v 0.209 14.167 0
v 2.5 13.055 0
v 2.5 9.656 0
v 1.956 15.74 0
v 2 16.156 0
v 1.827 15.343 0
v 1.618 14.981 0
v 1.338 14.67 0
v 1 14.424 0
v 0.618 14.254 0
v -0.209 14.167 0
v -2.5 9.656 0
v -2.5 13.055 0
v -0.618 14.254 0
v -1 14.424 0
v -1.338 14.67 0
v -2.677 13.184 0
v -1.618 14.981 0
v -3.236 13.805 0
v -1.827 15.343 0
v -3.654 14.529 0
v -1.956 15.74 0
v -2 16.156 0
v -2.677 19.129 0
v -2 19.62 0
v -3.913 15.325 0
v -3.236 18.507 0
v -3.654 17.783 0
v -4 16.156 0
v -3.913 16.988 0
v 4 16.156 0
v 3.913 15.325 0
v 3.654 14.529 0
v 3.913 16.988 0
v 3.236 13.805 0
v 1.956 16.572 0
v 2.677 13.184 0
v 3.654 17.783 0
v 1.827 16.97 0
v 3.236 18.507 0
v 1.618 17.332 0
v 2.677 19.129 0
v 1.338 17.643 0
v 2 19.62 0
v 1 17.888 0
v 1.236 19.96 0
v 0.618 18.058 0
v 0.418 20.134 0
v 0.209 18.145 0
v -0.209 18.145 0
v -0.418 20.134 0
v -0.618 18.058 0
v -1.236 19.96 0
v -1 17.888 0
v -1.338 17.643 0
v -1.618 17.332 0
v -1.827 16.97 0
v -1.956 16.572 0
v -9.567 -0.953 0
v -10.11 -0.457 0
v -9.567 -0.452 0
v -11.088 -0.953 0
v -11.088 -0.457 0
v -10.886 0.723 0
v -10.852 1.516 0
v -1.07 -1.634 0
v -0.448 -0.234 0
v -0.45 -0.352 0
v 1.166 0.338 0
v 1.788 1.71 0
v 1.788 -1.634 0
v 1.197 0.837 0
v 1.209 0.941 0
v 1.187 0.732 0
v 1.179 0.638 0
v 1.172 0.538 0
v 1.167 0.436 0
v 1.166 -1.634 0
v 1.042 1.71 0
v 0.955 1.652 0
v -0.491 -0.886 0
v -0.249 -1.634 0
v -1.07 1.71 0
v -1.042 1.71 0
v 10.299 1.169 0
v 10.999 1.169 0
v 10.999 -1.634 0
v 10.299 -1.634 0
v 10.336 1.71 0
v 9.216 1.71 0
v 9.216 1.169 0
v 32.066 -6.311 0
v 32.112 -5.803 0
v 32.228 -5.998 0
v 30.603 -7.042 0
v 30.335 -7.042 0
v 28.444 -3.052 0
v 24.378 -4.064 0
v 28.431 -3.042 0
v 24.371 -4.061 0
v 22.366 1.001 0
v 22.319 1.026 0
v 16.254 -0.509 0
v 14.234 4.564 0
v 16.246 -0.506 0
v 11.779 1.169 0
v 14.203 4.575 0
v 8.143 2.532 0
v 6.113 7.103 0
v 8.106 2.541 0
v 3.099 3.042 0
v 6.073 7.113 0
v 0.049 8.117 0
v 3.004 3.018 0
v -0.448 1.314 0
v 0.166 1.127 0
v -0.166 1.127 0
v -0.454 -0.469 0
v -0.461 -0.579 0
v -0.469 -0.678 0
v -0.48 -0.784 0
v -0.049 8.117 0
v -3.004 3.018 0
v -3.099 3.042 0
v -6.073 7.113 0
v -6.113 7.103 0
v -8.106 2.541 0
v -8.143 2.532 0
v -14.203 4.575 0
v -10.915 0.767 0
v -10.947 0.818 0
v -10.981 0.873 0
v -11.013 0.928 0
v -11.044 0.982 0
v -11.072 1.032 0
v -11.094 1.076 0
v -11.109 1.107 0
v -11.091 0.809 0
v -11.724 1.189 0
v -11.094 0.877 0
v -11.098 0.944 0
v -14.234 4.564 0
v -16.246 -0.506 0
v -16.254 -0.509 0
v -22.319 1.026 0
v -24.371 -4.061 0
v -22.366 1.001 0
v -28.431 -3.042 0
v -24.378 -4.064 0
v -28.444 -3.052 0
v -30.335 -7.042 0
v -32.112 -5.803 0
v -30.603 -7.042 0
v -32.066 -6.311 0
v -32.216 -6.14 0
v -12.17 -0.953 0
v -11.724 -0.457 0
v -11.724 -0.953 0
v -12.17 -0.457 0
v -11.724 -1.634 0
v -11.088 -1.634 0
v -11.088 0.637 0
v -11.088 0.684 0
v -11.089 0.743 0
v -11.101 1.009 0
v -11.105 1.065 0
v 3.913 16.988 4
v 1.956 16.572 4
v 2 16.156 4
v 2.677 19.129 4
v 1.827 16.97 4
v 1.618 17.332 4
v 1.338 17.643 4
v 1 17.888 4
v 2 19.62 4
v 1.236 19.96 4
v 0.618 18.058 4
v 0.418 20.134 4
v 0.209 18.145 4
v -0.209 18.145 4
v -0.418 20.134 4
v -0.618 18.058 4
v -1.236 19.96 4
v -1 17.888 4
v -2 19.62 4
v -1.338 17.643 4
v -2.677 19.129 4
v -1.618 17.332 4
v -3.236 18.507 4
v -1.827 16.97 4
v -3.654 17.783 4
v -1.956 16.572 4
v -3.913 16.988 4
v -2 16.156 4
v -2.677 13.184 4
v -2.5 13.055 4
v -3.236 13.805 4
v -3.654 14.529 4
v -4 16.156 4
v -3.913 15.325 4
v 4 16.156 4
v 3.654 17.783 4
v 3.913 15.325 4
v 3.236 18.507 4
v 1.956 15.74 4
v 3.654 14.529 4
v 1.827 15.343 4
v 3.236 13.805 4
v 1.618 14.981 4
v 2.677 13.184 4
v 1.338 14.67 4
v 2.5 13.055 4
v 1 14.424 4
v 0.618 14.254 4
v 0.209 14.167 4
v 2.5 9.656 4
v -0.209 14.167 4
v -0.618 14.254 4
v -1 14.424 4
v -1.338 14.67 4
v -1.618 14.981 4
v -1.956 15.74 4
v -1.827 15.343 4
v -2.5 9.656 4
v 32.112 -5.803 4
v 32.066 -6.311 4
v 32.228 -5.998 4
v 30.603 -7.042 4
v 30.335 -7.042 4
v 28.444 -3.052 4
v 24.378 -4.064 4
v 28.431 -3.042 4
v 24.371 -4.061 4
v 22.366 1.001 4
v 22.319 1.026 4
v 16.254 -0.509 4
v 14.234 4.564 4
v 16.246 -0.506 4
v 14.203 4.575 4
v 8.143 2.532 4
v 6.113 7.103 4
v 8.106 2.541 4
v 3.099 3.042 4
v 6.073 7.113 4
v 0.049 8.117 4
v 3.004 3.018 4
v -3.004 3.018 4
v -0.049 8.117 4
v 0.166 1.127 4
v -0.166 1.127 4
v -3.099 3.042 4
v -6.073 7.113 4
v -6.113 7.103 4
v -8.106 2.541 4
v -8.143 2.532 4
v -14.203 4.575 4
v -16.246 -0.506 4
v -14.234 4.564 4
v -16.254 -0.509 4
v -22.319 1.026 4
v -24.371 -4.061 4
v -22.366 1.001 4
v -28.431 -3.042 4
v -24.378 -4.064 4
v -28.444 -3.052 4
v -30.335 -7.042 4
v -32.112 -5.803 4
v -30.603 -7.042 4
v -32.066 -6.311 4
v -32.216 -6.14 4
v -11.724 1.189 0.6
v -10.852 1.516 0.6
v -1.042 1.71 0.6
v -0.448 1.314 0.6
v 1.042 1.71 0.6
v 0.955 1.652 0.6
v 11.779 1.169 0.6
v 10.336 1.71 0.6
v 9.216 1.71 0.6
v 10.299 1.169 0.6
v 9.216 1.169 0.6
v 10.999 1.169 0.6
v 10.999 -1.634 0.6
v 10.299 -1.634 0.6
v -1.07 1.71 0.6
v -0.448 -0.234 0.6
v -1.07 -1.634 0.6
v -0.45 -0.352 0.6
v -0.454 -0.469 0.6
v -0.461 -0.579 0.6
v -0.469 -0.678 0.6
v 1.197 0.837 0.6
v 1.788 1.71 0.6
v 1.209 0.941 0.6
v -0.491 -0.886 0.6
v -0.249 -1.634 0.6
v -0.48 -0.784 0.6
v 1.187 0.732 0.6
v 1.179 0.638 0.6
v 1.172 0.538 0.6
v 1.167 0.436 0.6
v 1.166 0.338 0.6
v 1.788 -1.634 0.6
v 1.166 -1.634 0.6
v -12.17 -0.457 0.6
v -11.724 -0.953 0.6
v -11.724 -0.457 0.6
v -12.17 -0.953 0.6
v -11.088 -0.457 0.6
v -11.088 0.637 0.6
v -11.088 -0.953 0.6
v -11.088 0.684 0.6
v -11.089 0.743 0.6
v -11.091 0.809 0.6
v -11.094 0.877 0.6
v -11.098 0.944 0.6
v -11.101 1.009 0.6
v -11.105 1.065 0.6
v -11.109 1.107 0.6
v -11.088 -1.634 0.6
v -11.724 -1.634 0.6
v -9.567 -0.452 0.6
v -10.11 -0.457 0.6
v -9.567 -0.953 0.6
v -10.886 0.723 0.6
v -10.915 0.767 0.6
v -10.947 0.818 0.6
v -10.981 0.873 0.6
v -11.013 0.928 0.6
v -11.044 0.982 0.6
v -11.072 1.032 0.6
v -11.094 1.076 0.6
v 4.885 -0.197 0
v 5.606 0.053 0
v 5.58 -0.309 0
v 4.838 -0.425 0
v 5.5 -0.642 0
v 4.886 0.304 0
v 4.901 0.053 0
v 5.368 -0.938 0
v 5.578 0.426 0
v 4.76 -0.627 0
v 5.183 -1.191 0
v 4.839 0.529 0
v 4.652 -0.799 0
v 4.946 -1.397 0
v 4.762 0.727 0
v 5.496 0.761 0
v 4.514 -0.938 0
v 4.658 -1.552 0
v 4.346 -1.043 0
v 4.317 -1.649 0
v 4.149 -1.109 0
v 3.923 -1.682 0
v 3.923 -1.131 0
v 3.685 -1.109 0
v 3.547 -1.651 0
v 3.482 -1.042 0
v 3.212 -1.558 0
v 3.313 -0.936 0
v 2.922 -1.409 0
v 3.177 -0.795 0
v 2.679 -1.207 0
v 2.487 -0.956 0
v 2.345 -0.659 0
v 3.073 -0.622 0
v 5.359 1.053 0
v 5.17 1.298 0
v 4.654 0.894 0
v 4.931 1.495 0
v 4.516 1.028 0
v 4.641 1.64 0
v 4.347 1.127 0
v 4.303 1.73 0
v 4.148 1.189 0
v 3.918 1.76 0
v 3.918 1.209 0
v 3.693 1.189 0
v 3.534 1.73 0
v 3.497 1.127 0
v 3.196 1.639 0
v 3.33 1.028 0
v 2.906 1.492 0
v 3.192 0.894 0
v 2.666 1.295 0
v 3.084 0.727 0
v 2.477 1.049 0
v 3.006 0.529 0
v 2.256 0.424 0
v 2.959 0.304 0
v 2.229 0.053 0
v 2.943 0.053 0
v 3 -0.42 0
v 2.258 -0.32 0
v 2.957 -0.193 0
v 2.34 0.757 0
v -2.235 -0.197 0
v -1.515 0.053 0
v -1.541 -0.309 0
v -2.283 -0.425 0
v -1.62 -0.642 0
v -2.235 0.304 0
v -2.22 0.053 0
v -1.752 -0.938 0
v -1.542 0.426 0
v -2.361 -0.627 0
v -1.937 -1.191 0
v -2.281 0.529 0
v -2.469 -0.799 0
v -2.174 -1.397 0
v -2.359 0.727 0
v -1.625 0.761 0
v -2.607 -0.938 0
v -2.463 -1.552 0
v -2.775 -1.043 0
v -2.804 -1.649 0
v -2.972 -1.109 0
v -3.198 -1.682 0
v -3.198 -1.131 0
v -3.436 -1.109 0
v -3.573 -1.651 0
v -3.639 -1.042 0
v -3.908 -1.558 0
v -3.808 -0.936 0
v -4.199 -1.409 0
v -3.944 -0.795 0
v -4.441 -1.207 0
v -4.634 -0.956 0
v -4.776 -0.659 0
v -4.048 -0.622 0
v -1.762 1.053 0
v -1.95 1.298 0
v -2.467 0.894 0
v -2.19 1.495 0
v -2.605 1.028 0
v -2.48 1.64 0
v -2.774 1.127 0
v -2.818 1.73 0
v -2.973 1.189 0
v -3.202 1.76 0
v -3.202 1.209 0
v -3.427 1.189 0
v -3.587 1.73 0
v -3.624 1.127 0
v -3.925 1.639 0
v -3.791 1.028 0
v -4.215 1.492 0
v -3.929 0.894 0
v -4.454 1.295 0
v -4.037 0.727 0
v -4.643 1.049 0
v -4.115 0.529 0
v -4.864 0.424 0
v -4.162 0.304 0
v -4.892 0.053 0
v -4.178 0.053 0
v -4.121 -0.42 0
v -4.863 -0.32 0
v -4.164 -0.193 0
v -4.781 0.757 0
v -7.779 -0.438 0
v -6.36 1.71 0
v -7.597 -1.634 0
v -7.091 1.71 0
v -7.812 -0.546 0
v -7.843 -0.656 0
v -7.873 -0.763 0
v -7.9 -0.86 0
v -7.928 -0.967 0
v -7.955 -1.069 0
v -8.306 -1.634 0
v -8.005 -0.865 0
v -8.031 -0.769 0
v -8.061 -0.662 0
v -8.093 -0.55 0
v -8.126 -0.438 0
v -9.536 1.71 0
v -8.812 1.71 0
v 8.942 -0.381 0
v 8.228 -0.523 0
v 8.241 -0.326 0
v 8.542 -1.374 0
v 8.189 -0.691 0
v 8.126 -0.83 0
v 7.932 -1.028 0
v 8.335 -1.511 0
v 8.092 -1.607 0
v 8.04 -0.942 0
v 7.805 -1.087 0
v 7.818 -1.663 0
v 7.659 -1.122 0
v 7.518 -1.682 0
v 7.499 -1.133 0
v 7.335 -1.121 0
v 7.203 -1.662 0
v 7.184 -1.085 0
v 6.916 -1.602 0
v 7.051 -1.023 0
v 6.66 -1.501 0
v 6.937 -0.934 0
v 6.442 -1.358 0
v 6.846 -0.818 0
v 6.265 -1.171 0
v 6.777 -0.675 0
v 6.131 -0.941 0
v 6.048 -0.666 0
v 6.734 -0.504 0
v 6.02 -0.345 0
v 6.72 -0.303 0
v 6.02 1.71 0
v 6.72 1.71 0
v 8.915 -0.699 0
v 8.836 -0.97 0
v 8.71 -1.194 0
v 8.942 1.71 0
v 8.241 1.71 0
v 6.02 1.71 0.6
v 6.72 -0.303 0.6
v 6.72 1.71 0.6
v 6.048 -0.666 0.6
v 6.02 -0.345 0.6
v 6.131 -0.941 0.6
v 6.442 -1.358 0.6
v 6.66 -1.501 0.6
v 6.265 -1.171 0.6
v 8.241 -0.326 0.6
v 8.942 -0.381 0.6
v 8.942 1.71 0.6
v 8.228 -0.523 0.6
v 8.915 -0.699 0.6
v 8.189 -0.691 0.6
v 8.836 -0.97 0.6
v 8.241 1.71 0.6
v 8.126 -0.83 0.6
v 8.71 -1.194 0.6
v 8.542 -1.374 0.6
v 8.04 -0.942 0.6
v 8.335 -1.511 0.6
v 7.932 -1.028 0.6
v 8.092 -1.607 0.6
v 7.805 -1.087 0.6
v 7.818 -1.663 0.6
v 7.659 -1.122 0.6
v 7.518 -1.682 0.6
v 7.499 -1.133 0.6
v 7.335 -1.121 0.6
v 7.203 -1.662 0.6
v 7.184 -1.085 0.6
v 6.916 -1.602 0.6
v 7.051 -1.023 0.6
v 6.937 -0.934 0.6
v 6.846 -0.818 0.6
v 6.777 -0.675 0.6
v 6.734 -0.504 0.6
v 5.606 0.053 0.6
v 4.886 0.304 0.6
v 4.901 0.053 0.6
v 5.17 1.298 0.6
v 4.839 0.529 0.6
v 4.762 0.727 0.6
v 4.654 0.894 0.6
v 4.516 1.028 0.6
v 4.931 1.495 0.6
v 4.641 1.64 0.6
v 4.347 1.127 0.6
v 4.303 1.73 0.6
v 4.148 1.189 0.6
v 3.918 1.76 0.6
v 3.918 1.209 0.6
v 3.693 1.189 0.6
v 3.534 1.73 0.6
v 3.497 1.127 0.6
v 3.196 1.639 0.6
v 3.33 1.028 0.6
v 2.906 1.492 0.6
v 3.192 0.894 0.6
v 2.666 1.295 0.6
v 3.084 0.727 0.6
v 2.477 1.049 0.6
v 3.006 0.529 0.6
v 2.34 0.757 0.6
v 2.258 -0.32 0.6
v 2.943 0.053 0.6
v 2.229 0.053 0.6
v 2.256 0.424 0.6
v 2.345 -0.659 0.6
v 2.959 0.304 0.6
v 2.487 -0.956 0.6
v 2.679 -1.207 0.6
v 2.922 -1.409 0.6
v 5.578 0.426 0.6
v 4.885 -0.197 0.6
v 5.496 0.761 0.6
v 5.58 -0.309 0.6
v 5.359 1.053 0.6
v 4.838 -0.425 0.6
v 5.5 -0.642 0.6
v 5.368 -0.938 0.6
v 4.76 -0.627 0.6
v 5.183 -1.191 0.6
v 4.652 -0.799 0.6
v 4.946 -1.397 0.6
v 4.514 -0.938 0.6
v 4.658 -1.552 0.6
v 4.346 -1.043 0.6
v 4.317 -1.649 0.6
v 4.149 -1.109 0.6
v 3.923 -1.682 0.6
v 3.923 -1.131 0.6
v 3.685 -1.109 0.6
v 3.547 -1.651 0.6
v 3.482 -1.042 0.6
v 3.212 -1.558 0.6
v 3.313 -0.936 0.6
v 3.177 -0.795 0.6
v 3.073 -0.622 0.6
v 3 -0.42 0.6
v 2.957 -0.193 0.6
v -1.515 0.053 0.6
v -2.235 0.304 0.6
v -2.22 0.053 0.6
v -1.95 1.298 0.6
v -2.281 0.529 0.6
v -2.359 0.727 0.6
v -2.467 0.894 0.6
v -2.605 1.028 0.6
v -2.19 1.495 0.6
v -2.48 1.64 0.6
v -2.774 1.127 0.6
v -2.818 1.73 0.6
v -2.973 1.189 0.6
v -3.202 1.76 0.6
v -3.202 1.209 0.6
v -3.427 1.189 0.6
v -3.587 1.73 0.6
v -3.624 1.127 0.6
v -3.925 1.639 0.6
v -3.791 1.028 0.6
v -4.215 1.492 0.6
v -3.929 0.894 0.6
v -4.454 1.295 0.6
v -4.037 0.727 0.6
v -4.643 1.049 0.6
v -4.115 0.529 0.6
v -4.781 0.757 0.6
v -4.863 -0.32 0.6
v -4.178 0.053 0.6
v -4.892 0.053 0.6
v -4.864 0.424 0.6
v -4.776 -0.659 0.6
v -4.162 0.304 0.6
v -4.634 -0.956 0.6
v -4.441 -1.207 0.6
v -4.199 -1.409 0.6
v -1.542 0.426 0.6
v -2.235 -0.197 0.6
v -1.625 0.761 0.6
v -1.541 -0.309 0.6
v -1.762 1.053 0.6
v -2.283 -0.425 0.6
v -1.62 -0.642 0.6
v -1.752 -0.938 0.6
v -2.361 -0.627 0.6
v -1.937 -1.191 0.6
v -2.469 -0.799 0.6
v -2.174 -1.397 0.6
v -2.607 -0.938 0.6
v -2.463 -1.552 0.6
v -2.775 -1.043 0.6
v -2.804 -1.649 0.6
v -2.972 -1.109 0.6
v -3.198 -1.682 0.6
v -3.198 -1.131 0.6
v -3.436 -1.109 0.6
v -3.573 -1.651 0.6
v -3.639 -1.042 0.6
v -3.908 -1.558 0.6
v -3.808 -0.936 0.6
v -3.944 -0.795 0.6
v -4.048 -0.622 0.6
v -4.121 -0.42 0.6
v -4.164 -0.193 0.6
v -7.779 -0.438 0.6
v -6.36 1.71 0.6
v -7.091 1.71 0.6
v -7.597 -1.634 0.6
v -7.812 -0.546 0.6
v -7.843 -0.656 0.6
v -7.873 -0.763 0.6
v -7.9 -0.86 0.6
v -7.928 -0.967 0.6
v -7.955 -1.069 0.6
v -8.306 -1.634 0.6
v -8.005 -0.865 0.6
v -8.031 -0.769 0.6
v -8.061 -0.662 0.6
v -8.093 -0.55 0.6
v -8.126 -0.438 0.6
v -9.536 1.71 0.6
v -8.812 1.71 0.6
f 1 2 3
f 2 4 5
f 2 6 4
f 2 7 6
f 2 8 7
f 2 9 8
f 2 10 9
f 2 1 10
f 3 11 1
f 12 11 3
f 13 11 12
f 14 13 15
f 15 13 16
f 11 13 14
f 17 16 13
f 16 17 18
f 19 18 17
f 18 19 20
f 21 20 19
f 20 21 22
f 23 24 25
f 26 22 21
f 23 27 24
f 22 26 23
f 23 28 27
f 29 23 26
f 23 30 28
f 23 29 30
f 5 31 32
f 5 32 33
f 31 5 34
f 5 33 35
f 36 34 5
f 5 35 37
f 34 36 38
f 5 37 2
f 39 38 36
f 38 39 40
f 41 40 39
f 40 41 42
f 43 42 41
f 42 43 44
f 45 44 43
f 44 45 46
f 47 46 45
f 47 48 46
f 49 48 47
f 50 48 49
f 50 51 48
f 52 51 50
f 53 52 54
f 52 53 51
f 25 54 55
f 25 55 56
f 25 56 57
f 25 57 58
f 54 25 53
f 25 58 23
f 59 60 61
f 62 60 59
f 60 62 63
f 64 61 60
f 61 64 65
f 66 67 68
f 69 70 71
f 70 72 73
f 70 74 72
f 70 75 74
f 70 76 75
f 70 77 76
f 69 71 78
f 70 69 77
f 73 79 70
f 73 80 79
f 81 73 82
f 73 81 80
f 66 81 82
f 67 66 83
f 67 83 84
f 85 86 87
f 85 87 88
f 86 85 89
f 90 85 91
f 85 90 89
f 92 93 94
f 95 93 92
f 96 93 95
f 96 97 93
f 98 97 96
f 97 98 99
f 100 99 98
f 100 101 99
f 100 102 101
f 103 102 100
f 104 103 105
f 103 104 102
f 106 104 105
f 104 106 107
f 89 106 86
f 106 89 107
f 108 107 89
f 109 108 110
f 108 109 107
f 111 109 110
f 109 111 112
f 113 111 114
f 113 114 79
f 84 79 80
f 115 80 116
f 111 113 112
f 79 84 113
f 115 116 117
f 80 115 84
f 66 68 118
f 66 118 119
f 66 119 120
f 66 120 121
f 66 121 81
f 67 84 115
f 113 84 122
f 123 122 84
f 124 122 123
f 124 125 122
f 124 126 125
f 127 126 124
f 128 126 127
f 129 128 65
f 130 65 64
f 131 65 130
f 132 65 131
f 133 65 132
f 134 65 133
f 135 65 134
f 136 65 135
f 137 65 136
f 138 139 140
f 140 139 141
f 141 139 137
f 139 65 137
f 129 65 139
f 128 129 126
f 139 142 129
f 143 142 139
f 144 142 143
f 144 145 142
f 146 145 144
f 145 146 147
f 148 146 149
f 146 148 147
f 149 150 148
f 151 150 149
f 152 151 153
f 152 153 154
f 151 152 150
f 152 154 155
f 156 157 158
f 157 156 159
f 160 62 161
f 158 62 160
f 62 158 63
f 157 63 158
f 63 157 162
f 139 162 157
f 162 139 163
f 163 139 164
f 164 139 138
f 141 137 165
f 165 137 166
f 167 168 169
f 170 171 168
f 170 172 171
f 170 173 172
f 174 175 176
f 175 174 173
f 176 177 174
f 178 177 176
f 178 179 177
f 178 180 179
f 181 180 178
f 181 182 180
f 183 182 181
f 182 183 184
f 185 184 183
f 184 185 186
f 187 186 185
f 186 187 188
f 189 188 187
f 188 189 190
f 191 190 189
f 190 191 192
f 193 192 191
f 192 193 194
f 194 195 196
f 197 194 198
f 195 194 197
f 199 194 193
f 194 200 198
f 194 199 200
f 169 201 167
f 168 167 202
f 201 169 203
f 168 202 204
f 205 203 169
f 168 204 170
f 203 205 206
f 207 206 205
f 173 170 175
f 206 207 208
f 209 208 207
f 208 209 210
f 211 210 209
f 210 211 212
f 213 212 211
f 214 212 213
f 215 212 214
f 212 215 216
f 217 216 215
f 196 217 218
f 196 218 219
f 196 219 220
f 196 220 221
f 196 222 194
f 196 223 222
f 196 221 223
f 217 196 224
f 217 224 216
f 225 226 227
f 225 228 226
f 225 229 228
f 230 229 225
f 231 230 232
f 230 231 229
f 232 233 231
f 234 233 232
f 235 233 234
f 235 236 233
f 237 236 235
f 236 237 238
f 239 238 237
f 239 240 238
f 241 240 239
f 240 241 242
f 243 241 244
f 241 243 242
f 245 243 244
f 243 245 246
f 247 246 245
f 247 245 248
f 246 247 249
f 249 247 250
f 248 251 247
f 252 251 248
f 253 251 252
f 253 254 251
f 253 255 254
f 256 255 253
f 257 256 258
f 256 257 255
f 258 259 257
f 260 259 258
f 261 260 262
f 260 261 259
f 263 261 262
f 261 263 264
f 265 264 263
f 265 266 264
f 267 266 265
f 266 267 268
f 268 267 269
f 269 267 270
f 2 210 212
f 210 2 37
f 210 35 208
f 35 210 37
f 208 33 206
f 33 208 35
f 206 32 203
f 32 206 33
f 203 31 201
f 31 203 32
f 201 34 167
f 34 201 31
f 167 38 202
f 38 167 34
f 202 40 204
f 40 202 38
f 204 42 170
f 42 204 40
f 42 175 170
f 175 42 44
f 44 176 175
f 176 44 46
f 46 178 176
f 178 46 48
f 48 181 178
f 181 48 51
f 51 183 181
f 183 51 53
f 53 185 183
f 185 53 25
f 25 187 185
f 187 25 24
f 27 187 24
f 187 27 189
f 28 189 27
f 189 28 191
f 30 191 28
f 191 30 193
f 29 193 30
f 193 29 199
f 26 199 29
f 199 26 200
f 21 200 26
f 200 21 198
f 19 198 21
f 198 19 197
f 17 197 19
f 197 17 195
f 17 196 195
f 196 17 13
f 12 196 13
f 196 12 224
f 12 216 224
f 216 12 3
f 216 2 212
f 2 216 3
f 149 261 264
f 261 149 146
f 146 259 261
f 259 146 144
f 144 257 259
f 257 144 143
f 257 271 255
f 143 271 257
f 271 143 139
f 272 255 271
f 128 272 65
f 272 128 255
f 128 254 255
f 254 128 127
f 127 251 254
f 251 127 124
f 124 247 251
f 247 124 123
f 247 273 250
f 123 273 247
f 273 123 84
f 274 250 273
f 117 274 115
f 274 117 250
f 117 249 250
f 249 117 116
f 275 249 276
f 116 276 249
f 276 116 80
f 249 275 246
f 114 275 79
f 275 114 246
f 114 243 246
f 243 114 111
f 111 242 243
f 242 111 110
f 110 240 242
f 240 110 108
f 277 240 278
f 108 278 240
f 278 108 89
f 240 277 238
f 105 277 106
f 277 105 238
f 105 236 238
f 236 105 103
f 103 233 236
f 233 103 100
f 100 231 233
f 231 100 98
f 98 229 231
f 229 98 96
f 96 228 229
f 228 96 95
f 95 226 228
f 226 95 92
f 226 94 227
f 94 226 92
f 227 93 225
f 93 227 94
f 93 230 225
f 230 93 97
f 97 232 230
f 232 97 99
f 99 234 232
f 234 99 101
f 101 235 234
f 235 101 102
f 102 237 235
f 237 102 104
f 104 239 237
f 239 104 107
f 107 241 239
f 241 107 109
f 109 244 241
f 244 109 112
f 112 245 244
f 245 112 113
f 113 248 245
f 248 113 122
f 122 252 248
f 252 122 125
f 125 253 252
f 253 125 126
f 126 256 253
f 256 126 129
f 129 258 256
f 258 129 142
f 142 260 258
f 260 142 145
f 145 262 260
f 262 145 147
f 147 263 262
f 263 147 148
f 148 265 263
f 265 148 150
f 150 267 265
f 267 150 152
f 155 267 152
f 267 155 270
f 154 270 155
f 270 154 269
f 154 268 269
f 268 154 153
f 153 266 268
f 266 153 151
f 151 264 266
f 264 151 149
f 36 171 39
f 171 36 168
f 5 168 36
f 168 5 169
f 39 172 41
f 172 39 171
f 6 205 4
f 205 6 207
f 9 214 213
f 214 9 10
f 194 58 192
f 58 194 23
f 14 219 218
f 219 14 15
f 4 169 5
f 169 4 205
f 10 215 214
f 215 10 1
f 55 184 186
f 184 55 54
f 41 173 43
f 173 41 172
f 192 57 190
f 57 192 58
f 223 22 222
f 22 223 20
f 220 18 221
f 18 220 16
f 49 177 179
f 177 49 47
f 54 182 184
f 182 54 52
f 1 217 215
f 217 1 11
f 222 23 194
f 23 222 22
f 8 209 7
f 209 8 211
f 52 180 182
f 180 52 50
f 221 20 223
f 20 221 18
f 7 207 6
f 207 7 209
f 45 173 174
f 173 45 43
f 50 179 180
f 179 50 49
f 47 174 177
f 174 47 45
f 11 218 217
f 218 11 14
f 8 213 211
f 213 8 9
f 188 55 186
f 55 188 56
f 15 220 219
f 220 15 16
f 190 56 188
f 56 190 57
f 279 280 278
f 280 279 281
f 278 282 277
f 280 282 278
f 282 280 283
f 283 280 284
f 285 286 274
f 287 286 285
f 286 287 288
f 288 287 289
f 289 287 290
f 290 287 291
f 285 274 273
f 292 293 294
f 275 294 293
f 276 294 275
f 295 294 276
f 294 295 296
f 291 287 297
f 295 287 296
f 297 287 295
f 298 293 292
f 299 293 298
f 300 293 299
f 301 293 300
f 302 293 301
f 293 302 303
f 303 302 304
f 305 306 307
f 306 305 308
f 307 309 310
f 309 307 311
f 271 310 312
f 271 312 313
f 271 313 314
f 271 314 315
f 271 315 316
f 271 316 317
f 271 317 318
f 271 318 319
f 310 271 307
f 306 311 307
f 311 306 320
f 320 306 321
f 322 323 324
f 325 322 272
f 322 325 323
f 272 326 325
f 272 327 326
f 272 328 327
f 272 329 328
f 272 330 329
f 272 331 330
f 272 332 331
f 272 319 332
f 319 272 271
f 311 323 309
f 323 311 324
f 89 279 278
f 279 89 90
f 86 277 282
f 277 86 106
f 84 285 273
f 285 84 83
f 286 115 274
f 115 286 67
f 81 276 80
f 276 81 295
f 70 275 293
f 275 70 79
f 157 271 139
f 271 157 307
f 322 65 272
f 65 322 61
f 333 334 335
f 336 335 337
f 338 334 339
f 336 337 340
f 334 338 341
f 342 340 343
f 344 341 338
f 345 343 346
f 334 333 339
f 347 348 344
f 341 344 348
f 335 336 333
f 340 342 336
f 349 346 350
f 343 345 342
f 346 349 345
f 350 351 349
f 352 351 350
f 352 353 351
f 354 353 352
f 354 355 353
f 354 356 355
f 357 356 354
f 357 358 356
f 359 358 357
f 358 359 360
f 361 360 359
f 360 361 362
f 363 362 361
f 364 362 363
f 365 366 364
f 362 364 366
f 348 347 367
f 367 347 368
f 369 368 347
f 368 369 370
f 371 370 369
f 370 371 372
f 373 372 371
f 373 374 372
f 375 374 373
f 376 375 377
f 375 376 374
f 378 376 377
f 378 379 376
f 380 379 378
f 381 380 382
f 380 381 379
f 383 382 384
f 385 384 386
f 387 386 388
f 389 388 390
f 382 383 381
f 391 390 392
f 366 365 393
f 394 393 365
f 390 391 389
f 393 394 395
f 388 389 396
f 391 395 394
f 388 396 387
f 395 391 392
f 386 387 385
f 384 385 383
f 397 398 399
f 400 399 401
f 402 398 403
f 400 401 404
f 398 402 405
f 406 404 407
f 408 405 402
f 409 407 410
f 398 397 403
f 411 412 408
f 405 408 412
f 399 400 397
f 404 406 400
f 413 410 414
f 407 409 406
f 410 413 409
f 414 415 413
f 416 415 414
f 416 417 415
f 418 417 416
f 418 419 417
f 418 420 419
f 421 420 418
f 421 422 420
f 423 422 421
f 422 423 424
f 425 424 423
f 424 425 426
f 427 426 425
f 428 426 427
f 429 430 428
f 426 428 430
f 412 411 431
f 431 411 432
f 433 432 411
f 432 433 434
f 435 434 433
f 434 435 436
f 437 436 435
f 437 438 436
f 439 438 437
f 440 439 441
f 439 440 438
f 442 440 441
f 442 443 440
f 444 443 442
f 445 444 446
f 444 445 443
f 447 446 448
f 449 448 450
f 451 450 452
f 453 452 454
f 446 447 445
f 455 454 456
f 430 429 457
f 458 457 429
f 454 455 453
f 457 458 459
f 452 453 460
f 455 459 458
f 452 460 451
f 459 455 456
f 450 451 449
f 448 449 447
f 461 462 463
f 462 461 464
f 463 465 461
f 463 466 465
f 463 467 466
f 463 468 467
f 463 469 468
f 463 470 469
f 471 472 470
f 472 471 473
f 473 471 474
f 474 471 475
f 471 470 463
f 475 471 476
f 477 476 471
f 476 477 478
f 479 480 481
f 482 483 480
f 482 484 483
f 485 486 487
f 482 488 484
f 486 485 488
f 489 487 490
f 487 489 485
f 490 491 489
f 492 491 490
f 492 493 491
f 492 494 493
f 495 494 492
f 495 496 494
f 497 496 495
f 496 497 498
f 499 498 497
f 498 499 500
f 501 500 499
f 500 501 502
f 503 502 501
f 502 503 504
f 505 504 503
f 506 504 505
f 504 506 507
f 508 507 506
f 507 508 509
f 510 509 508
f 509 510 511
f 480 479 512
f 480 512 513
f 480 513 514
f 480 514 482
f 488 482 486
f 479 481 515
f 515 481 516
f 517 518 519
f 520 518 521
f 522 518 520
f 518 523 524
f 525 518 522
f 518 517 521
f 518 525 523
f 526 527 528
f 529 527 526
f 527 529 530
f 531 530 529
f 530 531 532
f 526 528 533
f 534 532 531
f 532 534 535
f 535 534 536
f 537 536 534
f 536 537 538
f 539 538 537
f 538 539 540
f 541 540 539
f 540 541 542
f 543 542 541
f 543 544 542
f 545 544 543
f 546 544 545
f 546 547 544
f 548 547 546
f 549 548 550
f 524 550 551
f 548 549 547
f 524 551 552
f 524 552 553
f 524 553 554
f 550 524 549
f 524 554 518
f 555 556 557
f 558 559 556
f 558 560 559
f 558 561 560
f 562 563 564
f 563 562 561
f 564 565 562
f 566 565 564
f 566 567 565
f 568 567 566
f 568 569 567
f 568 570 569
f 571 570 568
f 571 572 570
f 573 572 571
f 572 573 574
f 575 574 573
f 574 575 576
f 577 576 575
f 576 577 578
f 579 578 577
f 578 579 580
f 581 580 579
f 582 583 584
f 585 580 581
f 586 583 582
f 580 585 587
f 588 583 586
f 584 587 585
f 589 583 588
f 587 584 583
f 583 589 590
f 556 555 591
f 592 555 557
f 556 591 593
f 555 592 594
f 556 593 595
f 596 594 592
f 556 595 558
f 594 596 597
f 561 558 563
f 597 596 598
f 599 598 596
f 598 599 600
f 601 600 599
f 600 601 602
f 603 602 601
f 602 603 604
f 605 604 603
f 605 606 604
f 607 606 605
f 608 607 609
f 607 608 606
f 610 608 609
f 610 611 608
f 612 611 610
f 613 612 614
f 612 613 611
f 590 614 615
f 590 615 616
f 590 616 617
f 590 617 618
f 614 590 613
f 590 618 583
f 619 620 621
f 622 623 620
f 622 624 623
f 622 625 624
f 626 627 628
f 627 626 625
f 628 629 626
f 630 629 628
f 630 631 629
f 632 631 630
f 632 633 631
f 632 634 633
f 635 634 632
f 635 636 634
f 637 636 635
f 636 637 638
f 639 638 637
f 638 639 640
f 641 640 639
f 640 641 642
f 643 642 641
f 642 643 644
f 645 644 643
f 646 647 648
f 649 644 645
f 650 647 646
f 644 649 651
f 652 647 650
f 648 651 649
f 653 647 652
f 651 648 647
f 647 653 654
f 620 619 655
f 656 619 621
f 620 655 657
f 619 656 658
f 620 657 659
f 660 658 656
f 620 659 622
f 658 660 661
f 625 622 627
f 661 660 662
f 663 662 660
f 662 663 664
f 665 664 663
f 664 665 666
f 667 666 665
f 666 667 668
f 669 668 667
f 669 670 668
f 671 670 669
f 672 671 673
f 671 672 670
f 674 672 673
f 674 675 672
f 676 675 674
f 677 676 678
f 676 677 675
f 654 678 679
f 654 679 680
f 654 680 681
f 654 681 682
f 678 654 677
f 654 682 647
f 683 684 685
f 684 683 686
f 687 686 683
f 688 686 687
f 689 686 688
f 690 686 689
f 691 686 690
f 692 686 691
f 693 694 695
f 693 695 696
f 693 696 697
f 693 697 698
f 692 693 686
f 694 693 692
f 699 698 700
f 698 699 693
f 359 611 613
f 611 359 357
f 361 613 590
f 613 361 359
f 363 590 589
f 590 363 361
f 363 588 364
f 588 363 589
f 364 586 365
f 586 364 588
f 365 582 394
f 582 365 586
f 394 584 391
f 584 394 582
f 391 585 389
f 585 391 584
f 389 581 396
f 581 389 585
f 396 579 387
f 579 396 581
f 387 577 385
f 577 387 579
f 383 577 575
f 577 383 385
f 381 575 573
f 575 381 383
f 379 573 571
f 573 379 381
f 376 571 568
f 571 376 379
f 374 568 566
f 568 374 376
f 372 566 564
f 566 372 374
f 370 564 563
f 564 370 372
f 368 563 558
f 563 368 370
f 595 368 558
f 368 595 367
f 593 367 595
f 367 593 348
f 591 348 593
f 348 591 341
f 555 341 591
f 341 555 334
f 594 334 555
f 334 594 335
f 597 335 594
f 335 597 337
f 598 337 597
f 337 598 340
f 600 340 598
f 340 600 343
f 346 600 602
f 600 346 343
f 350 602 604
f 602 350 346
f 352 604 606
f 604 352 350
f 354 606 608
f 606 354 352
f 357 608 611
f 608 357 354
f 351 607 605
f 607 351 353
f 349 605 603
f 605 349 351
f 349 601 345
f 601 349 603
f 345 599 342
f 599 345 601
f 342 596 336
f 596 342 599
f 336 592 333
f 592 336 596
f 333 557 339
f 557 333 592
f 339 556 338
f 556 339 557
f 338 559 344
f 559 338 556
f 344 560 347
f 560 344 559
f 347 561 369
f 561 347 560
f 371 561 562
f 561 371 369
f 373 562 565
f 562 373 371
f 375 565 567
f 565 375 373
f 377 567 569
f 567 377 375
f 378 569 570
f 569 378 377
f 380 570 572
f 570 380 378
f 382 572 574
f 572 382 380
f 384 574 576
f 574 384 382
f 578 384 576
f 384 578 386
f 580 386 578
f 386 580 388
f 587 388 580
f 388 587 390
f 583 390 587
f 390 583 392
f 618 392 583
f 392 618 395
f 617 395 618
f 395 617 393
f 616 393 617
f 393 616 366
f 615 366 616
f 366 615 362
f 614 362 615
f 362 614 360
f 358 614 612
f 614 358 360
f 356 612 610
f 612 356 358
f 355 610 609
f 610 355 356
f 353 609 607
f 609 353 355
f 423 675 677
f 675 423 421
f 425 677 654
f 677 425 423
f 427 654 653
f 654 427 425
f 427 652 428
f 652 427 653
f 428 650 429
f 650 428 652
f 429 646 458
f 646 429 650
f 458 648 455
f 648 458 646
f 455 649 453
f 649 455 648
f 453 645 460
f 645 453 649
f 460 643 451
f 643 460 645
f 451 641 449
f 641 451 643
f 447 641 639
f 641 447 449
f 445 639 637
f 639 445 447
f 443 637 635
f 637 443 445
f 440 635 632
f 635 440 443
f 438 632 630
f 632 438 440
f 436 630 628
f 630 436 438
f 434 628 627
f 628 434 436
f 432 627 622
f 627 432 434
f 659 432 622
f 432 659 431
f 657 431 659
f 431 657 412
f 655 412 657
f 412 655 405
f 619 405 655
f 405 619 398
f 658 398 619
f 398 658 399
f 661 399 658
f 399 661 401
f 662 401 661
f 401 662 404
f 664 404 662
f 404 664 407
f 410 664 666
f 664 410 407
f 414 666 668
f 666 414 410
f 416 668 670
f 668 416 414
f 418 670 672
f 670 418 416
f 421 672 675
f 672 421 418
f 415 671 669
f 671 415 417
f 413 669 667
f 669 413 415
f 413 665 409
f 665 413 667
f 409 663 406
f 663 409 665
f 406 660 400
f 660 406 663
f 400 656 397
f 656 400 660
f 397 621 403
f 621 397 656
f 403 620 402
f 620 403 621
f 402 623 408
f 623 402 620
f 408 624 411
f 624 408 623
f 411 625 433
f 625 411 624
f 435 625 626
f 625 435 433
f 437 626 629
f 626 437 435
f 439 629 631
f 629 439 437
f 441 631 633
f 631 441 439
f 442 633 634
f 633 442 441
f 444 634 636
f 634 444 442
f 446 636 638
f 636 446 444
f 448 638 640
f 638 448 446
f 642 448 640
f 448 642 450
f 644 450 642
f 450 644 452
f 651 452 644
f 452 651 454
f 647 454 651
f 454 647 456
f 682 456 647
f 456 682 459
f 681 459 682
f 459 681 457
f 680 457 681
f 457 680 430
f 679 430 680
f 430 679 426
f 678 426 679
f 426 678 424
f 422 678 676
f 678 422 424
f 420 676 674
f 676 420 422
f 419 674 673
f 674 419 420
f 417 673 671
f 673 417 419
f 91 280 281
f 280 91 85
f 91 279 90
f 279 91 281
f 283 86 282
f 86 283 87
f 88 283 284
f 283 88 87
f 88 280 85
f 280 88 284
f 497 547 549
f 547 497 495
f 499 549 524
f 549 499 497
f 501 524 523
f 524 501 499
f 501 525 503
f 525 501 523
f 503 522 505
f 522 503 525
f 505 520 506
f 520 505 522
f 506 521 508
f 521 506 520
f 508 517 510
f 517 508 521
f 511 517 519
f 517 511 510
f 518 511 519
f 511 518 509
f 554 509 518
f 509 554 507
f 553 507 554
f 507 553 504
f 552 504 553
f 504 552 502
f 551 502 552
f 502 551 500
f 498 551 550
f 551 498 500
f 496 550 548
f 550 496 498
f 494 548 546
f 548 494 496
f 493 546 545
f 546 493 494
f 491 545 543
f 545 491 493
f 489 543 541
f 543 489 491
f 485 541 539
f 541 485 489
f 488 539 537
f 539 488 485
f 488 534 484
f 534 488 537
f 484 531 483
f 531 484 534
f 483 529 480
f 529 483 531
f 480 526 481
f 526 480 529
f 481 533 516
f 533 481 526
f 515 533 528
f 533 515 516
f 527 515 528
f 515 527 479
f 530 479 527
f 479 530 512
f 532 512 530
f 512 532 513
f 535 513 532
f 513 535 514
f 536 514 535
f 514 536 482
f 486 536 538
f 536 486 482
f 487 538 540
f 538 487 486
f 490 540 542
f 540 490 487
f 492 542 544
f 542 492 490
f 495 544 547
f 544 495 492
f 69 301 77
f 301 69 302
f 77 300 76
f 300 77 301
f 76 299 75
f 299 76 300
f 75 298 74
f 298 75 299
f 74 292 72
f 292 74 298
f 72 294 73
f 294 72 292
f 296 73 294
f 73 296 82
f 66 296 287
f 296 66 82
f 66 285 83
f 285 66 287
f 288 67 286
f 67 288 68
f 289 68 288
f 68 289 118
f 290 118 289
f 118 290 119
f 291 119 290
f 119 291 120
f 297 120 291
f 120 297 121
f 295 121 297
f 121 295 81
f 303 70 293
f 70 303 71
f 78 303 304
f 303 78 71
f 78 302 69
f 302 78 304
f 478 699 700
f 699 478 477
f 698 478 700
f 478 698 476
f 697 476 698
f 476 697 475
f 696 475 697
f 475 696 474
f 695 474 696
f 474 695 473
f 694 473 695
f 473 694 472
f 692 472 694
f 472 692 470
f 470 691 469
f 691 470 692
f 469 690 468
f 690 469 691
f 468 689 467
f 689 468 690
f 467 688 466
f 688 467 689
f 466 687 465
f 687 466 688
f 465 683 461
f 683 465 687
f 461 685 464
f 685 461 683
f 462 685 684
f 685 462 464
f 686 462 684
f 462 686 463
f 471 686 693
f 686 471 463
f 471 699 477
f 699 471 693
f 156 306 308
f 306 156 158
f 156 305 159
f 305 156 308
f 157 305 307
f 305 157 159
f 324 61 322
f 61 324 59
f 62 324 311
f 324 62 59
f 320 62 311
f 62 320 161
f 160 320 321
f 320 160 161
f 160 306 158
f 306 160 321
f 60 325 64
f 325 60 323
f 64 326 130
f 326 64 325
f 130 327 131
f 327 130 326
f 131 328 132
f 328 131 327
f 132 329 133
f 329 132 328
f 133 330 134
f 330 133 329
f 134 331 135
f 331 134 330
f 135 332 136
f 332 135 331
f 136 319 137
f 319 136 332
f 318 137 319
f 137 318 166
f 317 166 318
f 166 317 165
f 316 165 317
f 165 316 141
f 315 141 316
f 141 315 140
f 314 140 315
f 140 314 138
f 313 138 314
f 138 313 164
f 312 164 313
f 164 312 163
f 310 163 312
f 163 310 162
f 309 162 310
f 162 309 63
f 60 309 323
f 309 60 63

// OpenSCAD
// === Aprilia Tuono V4 Factory Taillight Keychain ===
// Two-color AMS: black base + red detail, text on back

// --- Dimensions ---
width = 65;            // total wingspan
base_t = 2;            // black base layer thickness
detail_t = 2;          // red detail layer thickness
border = 0.8;          // black border around red detail
corner_r = 0.3;        // slight corner rounding

// Keyring mount
ring_od = 8;
ring_id = 4;
tab_w = 5;
tab_gap = 2;           // gap between shape top and ring center

// Back text
text_str = "TUONO V4";
text_size = 3.5;
text_depth = 0.6;

// --- Part Selection ---
part = "assembled";    // "base", "detail", "text", "assembled"

// --- Calculations ---
total_t = base_t + detail_t;
sf = width / 64;       // scale factor (shape defined in 64-unit space)
center_top_y = 10 * sf;
ring_cy = center_top_y + tab_gap + ring_od / 2;

// --- Taillight Profile ---
// Traced from Aprilia Tuono V4 Factory taillight silhouette
// Symmetric chevron/wing, origin at center, 64 units wide
// Top edge = upper wing contour, bottom edge = lower contour + center V-notch

tail_pts = [for (p = [
    // Top edge: center to right wing tip
    [0, 8], [6, 7], [14, 4.5], [22, 1], [28, -3], [32, -6],
    // Bottom edge: right tip back to center
    [30, -7], [24, -4], [16, -0.5], [8, 2.5],
    // Center bottom V-notch
    [3, 3], [0, 1], [-3, 3],
    // Bottom edge: center to left tip
    [-8, 2.5], [-16, -0.5], [-24, -4], [-30, -7],
    // Top edge: left tip back to center
    [-32, -6], [-28, -3], [-22, 1], [-14, 4.5], [-6, 7]
]) [p[0] * sf, p[1] * sf]];

// --- Modules ---

module taillight_2d() {
    offset(r = corner_r) offset(r = -corner_r)
        polygon(tail_pts);
}

module ring_mount_2d() {
    translate([0, ring_cy])
        circle(d = ring_od, $fn = 30);
    // Tapered tab connecting shape to ring
    hull() {
        translate([-tab_w / 2, center_top_y - 0.5])
            square([tab_w, 0.1]);
        translate([0, ring_cy])
            circle(d = tab_w, $fn = 20);
    }
}

module text_geo() {
    // Text on back face (z=0), mirrored X so it reads correctly when flipped
    translate([0, 0, 0])
    mirror([1, 0, 0])
    linear_extrude(text_depth)
        text(text_str, size = text_size, halign = "center", valign = "center",
             font = "Liberation Sans:style=Bold");
}

module base_part() {
    difference() {
        linear_extrude(total_t) {
            taillight_2d();
            ring_mount_2d();
        }
        // Keyring hole
        translate([0, ring_cy, -1])
            cylinder(d = ring_id, h = total_t + 2, $fn = 30);
        // Text recess on back
        text_geo();
    }
}

module detail_part() {
    translate([0, 0, base_t])
    linear_extrude(detail_t)
        offset(r = -border)
            taillight_2d();
}

// --- Render ---
if (part == "base") {
    base_part();
}

if (part == "detail") {
    detail_part();
}

if (part == "text") {
    text_geo();
}

if (part == "assembled") {
    color("DimGray") base_part();
    color("Red") detail_part();
    color("White") text_geo();
}
